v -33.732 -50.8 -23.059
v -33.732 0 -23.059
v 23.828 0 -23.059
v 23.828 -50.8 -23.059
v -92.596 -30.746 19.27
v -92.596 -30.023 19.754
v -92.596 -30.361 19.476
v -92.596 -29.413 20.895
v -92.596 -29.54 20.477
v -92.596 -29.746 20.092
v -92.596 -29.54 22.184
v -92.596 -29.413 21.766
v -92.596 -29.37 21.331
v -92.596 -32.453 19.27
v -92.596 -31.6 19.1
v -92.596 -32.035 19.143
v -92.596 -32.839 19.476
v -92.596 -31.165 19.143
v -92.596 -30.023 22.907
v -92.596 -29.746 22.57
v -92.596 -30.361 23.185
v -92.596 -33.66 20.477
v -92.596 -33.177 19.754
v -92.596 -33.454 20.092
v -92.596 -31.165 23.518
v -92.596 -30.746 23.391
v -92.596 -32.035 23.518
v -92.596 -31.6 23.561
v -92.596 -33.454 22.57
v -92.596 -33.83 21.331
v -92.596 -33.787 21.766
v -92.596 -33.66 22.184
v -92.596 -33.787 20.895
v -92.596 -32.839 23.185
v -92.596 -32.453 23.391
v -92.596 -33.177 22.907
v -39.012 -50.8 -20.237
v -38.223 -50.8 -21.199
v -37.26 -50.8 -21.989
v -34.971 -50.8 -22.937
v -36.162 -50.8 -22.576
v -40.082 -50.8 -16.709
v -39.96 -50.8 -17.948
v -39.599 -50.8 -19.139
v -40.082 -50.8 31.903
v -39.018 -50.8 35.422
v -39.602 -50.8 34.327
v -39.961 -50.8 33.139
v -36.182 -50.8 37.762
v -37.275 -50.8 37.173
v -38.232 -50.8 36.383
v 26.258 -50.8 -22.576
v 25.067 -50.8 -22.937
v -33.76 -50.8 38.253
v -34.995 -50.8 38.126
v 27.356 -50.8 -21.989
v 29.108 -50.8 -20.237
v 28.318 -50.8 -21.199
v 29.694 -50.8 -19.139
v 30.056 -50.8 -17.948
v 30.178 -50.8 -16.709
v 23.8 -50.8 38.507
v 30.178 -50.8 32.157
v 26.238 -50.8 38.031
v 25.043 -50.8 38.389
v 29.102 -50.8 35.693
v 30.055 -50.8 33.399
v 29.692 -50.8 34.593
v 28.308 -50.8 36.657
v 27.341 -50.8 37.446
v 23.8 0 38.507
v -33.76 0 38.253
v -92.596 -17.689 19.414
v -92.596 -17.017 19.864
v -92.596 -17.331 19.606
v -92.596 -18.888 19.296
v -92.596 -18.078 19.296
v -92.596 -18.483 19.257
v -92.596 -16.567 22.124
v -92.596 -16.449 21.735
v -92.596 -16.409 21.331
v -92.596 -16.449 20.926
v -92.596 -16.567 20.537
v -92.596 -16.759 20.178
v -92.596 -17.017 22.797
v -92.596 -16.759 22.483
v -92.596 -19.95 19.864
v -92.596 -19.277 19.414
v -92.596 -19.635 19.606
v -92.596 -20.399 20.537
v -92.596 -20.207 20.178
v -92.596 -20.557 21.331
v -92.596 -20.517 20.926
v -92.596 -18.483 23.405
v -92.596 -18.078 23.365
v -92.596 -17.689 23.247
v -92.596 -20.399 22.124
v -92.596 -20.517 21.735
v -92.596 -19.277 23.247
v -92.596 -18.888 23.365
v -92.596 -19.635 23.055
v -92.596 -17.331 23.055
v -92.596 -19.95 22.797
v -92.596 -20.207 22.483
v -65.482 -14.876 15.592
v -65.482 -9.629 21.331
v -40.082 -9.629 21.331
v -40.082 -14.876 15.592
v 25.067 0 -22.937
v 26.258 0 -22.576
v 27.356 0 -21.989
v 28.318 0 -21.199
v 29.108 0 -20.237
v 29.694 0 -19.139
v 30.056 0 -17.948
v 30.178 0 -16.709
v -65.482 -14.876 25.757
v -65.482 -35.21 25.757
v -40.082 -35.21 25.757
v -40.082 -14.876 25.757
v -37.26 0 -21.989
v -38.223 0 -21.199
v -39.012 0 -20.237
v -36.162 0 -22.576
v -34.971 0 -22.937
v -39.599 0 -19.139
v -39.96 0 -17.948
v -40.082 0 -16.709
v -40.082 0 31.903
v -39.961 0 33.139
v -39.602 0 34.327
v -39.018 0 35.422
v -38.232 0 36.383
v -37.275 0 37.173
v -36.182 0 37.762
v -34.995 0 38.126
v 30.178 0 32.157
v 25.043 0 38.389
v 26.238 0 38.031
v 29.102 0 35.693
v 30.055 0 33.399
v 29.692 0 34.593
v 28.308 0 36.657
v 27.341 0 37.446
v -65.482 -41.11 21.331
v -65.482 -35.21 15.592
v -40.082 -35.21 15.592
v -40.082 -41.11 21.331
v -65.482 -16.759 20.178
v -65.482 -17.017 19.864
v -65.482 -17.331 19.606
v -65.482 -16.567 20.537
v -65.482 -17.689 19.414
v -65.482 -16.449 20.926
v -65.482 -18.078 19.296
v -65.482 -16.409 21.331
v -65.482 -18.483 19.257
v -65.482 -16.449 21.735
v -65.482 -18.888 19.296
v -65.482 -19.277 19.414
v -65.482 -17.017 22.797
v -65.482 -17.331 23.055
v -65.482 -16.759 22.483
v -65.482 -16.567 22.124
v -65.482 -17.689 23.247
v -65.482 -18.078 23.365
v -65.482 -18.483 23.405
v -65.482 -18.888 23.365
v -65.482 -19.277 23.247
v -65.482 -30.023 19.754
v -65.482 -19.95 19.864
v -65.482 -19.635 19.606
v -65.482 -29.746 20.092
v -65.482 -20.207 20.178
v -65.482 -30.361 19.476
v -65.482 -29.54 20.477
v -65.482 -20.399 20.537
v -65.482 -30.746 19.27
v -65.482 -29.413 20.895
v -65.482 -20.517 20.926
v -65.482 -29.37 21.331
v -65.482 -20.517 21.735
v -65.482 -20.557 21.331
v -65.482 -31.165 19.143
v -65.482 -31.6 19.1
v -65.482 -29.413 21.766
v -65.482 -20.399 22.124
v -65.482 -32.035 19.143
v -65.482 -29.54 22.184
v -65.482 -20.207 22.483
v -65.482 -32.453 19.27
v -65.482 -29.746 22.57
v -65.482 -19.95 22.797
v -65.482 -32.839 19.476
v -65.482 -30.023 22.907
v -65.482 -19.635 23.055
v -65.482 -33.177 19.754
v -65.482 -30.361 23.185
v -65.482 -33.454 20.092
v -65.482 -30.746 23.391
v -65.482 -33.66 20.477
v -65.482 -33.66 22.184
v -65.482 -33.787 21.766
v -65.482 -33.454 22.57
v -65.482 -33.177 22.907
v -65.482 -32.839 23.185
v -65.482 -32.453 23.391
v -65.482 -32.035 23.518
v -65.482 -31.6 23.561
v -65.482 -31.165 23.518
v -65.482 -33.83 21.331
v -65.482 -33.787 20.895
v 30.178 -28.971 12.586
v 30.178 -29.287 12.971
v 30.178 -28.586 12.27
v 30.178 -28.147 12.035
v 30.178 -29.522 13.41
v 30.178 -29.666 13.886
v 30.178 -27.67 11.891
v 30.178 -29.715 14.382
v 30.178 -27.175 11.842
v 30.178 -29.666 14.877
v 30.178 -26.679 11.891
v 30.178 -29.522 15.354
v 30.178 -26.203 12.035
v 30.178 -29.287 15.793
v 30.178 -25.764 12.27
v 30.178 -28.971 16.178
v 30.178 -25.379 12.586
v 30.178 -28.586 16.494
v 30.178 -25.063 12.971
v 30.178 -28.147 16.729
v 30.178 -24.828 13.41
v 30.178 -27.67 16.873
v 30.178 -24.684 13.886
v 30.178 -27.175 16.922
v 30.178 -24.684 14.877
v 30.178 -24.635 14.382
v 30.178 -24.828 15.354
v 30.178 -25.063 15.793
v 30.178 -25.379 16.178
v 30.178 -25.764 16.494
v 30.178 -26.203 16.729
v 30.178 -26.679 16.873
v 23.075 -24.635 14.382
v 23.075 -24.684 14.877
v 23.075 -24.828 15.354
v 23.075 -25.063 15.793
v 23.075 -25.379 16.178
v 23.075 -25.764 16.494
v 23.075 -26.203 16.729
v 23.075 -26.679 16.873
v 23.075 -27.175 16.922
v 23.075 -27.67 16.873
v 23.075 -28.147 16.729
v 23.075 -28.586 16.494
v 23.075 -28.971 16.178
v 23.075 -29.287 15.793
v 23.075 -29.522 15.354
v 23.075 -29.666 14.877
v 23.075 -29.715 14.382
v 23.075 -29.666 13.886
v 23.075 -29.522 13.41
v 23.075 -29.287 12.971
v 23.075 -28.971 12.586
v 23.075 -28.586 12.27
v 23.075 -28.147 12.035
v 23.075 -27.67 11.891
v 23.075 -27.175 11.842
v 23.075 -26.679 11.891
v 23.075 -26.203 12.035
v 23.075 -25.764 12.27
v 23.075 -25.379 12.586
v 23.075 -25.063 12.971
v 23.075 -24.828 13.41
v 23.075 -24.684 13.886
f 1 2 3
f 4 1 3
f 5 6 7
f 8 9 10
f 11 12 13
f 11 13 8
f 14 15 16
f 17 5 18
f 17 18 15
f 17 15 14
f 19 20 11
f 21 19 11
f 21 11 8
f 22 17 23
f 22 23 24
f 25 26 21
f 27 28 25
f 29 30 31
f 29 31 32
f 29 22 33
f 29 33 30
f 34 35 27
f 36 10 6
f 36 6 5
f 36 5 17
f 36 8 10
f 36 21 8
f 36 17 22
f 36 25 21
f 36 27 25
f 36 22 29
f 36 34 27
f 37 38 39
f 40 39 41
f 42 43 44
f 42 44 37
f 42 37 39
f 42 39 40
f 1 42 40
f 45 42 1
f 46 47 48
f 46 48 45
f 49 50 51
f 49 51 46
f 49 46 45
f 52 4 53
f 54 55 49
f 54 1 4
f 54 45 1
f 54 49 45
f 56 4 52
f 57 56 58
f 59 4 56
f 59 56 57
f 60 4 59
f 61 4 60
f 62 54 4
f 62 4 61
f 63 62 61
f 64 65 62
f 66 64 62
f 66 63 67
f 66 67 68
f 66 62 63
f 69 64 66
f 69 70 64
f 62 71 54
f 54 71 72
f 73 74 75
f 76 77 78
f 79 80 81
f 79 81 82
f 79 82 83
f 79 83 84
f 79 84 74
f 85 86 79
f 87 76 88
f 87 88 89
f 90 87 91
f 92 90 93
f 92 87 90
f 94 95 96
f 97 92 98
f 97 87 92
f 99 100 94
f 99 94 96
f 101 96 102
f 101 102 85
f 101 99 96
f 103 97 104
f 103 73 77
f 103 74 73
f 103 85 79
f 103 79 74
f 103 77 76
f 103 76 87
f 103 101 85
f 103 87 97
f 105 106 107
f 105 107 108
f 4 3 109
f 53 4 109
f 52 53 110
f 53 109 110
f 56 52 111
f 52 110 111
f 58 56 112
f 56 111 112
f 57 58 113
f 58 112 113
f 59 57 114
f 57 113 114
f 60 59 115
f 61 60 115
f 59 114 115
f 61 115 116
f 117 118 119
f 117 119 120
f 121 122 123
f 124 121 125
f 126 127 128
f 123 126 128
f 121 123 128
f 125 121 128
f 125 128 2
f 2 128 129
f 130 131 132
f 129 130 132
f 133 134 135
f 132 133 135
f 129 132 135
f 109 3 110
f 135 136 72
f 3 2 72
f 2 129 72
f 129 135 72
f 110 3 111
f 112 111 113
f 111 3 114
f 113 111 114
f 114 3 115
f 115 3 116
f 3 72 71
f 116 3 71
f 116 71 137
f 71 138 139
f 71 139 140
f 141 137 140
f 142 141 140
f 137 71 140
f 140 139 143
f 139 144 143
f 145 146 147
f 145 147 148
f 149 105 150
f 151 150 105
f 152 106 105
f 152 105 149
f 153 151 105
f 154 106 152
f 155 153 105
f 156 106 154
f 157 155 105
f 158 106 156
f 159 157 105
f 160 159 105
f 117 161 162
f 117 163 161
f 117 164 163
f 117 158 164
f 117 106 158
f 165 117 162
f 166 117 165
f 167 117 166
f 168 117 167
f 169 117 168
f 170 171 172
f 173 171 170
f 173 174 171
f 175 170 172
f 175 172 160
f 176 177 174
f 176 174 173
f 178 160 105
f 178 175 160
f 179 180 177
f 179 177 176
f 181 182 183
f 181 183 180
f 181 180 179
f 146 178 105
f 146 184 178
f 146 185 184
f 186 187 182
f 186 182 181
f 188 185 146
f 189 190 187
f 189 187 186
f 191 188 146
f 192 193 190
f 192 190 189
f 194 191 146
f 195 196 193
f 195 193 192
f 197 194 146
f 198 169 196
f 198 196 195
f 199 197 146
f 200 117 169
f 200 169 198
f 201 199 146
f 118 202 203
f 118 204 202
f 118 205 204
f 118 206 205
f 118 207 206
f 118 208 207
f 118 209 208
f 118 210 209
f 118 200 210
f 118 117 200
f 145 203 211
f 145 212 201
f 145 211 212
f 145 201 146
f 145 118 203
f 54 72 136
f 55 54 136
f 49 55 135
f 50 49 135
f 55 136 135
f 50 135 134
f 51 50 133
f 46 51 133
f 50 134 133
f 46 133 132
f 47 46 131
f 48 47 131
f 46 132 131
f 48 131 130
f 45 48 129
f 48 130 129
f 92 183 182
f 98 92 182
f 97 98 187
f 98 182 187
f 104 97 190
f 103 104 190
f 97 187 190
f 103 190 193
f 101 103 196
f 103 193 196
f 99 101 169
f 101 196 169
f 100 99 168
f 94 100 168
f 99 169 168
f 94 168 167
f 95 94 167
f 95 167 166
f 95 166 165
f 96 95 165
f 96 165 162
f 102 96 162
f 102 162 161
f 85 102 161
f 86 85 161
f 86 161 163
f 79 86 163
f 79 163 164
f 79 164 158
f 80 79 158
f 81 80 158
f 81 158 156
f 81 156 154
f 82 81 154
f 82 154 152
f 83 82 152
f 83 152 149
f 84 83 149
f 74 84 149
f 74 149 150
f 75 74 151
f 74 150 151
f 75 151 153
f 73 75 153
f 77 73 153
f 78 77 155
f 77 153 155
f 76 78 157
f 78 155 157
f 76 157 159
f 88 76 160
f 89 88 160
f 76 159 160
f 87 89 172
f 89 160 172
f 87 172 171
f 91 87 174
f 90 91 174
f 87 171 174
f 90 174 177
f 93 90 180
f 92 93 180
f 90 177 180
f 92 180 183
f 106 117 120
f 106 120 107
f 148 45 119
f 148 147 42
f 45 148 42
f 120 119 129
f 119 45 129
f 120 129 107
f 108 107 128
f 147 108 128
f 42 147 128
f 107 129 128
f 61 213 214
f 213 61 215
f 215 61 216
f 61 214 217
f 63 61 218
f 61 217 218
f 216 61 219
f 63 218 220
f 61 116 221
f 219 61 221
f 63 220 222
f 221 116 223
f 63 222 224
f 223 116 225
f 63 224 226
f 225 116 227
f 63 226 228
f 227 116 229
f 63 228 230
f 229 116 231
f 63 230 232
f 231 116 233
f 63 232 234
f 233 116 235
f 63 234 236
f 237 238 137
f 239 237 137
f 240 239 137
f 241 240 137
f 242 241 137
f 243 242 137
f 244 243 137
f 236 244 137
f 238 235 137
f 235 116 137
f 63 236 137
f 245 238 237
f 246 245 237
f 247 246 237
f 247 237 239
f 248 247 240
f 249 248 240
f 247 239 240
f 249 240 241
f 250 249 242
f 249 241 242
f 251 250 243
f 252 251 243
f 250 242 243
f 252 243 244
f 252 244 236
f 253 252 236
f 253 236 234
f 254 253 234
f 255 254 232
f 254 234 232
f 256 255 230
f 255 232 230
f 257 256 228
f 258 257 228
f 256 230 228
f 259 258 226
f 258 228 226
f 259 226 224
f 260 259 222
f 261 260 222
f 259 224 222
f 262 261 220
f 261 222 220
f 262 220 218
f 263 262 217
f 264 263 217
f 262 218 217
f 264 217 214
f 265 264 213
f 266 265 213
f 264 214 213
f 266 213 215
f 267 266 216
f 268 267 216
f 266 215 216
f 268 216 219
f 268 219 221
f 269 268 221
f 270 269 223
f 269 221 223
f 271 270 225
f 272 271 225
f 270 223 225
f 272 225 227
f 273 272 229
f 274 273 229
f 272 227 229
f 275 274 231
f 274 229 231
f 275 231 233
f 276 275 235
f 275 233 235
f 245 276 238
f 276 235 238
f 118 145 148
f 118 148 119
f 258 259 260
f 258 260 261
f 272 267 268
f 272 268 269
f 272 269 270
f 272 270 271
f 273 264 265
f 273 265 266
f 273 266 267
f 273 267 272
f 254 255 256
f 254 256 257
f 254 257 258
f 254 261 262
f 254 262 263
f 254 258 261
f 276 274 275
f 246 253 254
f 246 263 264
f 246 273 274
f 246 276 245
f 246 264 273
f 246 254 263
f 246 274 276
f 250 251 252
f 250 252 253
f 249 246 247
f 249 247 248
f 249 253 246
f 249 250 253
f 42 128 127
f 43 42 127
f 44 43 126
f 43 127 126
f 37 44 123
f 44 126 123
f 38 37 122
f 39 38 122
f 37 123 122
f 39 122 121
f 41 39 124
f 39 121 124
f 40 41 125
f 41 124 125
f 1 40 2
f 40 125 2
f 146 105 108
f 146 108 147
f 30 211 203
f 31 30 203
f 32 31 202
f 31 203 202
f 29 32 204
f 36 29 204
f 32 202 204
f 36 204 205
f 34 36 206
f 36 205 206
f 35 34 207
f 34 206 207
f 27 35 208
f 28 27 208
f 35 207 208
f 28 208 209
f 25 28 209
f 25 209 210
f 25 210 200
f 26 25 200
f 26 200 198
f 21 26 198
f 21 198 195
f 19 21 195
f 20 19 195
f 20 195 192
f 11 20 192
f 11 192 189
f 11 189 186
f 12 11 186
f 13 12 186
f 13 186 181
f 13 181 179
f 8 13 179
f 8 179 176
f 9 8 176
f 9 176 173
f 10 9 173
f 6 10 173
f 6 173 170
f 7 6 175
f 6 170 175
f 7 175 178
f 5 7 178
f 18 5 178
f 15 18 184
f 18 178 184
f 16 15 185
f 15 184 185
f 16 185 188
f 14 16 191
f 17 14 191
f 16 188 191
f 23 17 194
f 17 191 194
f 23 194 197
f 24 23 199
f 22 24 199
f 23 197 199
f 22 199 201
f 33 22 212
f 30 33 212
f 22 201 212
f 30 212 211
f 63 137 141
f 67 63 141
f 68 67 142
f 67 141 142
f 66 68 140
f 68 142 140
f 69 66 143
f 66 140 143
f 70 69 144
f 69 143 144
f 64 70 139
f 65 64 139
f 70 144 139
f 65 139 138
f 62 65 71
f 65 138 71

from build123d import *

# Parameters (mm, degrees)
F1_DEPTH = 50.8
F2_R     = 2.073956
F2_R_2   = 2.230105
F3_DEPTH = 25.4
F4_DEPTH = 52.51404
F5_R     = 2.54
F6_DEPTH = 7.10246


with BuildPart() as f1:
    # F0 (on Front) → F1 (new body)
    with BuildSketch(Plane.XZ):
        with BuildLine():
            ThreePointArc((-33.760353, 38.253132), (-38.232387, 36.383421), (-40.08238, 31.903194))
            Line((-40.08238, 31.903194), (-40.08238, -16.708975))
            ThreePointArc((-40.08238, -16.708975), (-38.222508, -21.199103), (-33.73238, -23.058975))
            Line((-33.73238, -23.058975), (23.82785, -23.058975))
            ThreePointArc((23.82785, -23.058975), (28.317978, -21.199103), (30.17785, -16.708975))
            Line((30.17785, -16.708975), (30.17785, 32.156763))
            ThreePointArc((30.17785, 32.156763), (28.308077, 36.65677), (23.799877, 38.506701))
            Line((23.799877, 38.506701), (-33.760353, 38.253132))
        make_face()
    extrude(amount=F1_DEPTH)

    # F2 (on face) → F3 (join)
    with BuildSketch(Plane(origin=(-40.08238, 0, 0), x_dir=(0, -1, 0), z_dir=(-1, 0, 0))):
        Polygon((14.87593, 25.757497), (9.62919, 21.33056), (14.87593, 15.591938), (35.209692, 15.591938), (41.109629, 21.33056), (35.209692, 25.757497), align=None)
        with Locations((18.483063, 21.33056)):
            Circle(F2_R, mode=Mode.SUBTRACT)
        with Locations((31.599913, 21.33056)):
            Circle(F2_R_2, mode=Mode.SUBTRACT)
    extrude(amount=F3_DEPTH)

    # F2 (on face) → F4 (join)
    with BuildSketch(Plane(origin=(-40.08238, 0, 0), x_dir=(0, -1, 0), z_dir=(-1, 0, 0))):
        with Locations((18.483063, 21.33056)):
            Circle(F2_R)
        with Locations((31.599913, 21.33056)):
            Circle(F2_R_2)
    extrude(amount=F4_DEPTH)

    # F5 (on face) → F6 (cut)
    with BuildSketch(Plane.YZ.offset(30.17785)):
        with Locations((-27.174922, 14.381909)):
            Circle(F5_R)
    extrude(amount=-F6_DEPTH, mode=Mode.SUBTRACT)


solid = f1.part
